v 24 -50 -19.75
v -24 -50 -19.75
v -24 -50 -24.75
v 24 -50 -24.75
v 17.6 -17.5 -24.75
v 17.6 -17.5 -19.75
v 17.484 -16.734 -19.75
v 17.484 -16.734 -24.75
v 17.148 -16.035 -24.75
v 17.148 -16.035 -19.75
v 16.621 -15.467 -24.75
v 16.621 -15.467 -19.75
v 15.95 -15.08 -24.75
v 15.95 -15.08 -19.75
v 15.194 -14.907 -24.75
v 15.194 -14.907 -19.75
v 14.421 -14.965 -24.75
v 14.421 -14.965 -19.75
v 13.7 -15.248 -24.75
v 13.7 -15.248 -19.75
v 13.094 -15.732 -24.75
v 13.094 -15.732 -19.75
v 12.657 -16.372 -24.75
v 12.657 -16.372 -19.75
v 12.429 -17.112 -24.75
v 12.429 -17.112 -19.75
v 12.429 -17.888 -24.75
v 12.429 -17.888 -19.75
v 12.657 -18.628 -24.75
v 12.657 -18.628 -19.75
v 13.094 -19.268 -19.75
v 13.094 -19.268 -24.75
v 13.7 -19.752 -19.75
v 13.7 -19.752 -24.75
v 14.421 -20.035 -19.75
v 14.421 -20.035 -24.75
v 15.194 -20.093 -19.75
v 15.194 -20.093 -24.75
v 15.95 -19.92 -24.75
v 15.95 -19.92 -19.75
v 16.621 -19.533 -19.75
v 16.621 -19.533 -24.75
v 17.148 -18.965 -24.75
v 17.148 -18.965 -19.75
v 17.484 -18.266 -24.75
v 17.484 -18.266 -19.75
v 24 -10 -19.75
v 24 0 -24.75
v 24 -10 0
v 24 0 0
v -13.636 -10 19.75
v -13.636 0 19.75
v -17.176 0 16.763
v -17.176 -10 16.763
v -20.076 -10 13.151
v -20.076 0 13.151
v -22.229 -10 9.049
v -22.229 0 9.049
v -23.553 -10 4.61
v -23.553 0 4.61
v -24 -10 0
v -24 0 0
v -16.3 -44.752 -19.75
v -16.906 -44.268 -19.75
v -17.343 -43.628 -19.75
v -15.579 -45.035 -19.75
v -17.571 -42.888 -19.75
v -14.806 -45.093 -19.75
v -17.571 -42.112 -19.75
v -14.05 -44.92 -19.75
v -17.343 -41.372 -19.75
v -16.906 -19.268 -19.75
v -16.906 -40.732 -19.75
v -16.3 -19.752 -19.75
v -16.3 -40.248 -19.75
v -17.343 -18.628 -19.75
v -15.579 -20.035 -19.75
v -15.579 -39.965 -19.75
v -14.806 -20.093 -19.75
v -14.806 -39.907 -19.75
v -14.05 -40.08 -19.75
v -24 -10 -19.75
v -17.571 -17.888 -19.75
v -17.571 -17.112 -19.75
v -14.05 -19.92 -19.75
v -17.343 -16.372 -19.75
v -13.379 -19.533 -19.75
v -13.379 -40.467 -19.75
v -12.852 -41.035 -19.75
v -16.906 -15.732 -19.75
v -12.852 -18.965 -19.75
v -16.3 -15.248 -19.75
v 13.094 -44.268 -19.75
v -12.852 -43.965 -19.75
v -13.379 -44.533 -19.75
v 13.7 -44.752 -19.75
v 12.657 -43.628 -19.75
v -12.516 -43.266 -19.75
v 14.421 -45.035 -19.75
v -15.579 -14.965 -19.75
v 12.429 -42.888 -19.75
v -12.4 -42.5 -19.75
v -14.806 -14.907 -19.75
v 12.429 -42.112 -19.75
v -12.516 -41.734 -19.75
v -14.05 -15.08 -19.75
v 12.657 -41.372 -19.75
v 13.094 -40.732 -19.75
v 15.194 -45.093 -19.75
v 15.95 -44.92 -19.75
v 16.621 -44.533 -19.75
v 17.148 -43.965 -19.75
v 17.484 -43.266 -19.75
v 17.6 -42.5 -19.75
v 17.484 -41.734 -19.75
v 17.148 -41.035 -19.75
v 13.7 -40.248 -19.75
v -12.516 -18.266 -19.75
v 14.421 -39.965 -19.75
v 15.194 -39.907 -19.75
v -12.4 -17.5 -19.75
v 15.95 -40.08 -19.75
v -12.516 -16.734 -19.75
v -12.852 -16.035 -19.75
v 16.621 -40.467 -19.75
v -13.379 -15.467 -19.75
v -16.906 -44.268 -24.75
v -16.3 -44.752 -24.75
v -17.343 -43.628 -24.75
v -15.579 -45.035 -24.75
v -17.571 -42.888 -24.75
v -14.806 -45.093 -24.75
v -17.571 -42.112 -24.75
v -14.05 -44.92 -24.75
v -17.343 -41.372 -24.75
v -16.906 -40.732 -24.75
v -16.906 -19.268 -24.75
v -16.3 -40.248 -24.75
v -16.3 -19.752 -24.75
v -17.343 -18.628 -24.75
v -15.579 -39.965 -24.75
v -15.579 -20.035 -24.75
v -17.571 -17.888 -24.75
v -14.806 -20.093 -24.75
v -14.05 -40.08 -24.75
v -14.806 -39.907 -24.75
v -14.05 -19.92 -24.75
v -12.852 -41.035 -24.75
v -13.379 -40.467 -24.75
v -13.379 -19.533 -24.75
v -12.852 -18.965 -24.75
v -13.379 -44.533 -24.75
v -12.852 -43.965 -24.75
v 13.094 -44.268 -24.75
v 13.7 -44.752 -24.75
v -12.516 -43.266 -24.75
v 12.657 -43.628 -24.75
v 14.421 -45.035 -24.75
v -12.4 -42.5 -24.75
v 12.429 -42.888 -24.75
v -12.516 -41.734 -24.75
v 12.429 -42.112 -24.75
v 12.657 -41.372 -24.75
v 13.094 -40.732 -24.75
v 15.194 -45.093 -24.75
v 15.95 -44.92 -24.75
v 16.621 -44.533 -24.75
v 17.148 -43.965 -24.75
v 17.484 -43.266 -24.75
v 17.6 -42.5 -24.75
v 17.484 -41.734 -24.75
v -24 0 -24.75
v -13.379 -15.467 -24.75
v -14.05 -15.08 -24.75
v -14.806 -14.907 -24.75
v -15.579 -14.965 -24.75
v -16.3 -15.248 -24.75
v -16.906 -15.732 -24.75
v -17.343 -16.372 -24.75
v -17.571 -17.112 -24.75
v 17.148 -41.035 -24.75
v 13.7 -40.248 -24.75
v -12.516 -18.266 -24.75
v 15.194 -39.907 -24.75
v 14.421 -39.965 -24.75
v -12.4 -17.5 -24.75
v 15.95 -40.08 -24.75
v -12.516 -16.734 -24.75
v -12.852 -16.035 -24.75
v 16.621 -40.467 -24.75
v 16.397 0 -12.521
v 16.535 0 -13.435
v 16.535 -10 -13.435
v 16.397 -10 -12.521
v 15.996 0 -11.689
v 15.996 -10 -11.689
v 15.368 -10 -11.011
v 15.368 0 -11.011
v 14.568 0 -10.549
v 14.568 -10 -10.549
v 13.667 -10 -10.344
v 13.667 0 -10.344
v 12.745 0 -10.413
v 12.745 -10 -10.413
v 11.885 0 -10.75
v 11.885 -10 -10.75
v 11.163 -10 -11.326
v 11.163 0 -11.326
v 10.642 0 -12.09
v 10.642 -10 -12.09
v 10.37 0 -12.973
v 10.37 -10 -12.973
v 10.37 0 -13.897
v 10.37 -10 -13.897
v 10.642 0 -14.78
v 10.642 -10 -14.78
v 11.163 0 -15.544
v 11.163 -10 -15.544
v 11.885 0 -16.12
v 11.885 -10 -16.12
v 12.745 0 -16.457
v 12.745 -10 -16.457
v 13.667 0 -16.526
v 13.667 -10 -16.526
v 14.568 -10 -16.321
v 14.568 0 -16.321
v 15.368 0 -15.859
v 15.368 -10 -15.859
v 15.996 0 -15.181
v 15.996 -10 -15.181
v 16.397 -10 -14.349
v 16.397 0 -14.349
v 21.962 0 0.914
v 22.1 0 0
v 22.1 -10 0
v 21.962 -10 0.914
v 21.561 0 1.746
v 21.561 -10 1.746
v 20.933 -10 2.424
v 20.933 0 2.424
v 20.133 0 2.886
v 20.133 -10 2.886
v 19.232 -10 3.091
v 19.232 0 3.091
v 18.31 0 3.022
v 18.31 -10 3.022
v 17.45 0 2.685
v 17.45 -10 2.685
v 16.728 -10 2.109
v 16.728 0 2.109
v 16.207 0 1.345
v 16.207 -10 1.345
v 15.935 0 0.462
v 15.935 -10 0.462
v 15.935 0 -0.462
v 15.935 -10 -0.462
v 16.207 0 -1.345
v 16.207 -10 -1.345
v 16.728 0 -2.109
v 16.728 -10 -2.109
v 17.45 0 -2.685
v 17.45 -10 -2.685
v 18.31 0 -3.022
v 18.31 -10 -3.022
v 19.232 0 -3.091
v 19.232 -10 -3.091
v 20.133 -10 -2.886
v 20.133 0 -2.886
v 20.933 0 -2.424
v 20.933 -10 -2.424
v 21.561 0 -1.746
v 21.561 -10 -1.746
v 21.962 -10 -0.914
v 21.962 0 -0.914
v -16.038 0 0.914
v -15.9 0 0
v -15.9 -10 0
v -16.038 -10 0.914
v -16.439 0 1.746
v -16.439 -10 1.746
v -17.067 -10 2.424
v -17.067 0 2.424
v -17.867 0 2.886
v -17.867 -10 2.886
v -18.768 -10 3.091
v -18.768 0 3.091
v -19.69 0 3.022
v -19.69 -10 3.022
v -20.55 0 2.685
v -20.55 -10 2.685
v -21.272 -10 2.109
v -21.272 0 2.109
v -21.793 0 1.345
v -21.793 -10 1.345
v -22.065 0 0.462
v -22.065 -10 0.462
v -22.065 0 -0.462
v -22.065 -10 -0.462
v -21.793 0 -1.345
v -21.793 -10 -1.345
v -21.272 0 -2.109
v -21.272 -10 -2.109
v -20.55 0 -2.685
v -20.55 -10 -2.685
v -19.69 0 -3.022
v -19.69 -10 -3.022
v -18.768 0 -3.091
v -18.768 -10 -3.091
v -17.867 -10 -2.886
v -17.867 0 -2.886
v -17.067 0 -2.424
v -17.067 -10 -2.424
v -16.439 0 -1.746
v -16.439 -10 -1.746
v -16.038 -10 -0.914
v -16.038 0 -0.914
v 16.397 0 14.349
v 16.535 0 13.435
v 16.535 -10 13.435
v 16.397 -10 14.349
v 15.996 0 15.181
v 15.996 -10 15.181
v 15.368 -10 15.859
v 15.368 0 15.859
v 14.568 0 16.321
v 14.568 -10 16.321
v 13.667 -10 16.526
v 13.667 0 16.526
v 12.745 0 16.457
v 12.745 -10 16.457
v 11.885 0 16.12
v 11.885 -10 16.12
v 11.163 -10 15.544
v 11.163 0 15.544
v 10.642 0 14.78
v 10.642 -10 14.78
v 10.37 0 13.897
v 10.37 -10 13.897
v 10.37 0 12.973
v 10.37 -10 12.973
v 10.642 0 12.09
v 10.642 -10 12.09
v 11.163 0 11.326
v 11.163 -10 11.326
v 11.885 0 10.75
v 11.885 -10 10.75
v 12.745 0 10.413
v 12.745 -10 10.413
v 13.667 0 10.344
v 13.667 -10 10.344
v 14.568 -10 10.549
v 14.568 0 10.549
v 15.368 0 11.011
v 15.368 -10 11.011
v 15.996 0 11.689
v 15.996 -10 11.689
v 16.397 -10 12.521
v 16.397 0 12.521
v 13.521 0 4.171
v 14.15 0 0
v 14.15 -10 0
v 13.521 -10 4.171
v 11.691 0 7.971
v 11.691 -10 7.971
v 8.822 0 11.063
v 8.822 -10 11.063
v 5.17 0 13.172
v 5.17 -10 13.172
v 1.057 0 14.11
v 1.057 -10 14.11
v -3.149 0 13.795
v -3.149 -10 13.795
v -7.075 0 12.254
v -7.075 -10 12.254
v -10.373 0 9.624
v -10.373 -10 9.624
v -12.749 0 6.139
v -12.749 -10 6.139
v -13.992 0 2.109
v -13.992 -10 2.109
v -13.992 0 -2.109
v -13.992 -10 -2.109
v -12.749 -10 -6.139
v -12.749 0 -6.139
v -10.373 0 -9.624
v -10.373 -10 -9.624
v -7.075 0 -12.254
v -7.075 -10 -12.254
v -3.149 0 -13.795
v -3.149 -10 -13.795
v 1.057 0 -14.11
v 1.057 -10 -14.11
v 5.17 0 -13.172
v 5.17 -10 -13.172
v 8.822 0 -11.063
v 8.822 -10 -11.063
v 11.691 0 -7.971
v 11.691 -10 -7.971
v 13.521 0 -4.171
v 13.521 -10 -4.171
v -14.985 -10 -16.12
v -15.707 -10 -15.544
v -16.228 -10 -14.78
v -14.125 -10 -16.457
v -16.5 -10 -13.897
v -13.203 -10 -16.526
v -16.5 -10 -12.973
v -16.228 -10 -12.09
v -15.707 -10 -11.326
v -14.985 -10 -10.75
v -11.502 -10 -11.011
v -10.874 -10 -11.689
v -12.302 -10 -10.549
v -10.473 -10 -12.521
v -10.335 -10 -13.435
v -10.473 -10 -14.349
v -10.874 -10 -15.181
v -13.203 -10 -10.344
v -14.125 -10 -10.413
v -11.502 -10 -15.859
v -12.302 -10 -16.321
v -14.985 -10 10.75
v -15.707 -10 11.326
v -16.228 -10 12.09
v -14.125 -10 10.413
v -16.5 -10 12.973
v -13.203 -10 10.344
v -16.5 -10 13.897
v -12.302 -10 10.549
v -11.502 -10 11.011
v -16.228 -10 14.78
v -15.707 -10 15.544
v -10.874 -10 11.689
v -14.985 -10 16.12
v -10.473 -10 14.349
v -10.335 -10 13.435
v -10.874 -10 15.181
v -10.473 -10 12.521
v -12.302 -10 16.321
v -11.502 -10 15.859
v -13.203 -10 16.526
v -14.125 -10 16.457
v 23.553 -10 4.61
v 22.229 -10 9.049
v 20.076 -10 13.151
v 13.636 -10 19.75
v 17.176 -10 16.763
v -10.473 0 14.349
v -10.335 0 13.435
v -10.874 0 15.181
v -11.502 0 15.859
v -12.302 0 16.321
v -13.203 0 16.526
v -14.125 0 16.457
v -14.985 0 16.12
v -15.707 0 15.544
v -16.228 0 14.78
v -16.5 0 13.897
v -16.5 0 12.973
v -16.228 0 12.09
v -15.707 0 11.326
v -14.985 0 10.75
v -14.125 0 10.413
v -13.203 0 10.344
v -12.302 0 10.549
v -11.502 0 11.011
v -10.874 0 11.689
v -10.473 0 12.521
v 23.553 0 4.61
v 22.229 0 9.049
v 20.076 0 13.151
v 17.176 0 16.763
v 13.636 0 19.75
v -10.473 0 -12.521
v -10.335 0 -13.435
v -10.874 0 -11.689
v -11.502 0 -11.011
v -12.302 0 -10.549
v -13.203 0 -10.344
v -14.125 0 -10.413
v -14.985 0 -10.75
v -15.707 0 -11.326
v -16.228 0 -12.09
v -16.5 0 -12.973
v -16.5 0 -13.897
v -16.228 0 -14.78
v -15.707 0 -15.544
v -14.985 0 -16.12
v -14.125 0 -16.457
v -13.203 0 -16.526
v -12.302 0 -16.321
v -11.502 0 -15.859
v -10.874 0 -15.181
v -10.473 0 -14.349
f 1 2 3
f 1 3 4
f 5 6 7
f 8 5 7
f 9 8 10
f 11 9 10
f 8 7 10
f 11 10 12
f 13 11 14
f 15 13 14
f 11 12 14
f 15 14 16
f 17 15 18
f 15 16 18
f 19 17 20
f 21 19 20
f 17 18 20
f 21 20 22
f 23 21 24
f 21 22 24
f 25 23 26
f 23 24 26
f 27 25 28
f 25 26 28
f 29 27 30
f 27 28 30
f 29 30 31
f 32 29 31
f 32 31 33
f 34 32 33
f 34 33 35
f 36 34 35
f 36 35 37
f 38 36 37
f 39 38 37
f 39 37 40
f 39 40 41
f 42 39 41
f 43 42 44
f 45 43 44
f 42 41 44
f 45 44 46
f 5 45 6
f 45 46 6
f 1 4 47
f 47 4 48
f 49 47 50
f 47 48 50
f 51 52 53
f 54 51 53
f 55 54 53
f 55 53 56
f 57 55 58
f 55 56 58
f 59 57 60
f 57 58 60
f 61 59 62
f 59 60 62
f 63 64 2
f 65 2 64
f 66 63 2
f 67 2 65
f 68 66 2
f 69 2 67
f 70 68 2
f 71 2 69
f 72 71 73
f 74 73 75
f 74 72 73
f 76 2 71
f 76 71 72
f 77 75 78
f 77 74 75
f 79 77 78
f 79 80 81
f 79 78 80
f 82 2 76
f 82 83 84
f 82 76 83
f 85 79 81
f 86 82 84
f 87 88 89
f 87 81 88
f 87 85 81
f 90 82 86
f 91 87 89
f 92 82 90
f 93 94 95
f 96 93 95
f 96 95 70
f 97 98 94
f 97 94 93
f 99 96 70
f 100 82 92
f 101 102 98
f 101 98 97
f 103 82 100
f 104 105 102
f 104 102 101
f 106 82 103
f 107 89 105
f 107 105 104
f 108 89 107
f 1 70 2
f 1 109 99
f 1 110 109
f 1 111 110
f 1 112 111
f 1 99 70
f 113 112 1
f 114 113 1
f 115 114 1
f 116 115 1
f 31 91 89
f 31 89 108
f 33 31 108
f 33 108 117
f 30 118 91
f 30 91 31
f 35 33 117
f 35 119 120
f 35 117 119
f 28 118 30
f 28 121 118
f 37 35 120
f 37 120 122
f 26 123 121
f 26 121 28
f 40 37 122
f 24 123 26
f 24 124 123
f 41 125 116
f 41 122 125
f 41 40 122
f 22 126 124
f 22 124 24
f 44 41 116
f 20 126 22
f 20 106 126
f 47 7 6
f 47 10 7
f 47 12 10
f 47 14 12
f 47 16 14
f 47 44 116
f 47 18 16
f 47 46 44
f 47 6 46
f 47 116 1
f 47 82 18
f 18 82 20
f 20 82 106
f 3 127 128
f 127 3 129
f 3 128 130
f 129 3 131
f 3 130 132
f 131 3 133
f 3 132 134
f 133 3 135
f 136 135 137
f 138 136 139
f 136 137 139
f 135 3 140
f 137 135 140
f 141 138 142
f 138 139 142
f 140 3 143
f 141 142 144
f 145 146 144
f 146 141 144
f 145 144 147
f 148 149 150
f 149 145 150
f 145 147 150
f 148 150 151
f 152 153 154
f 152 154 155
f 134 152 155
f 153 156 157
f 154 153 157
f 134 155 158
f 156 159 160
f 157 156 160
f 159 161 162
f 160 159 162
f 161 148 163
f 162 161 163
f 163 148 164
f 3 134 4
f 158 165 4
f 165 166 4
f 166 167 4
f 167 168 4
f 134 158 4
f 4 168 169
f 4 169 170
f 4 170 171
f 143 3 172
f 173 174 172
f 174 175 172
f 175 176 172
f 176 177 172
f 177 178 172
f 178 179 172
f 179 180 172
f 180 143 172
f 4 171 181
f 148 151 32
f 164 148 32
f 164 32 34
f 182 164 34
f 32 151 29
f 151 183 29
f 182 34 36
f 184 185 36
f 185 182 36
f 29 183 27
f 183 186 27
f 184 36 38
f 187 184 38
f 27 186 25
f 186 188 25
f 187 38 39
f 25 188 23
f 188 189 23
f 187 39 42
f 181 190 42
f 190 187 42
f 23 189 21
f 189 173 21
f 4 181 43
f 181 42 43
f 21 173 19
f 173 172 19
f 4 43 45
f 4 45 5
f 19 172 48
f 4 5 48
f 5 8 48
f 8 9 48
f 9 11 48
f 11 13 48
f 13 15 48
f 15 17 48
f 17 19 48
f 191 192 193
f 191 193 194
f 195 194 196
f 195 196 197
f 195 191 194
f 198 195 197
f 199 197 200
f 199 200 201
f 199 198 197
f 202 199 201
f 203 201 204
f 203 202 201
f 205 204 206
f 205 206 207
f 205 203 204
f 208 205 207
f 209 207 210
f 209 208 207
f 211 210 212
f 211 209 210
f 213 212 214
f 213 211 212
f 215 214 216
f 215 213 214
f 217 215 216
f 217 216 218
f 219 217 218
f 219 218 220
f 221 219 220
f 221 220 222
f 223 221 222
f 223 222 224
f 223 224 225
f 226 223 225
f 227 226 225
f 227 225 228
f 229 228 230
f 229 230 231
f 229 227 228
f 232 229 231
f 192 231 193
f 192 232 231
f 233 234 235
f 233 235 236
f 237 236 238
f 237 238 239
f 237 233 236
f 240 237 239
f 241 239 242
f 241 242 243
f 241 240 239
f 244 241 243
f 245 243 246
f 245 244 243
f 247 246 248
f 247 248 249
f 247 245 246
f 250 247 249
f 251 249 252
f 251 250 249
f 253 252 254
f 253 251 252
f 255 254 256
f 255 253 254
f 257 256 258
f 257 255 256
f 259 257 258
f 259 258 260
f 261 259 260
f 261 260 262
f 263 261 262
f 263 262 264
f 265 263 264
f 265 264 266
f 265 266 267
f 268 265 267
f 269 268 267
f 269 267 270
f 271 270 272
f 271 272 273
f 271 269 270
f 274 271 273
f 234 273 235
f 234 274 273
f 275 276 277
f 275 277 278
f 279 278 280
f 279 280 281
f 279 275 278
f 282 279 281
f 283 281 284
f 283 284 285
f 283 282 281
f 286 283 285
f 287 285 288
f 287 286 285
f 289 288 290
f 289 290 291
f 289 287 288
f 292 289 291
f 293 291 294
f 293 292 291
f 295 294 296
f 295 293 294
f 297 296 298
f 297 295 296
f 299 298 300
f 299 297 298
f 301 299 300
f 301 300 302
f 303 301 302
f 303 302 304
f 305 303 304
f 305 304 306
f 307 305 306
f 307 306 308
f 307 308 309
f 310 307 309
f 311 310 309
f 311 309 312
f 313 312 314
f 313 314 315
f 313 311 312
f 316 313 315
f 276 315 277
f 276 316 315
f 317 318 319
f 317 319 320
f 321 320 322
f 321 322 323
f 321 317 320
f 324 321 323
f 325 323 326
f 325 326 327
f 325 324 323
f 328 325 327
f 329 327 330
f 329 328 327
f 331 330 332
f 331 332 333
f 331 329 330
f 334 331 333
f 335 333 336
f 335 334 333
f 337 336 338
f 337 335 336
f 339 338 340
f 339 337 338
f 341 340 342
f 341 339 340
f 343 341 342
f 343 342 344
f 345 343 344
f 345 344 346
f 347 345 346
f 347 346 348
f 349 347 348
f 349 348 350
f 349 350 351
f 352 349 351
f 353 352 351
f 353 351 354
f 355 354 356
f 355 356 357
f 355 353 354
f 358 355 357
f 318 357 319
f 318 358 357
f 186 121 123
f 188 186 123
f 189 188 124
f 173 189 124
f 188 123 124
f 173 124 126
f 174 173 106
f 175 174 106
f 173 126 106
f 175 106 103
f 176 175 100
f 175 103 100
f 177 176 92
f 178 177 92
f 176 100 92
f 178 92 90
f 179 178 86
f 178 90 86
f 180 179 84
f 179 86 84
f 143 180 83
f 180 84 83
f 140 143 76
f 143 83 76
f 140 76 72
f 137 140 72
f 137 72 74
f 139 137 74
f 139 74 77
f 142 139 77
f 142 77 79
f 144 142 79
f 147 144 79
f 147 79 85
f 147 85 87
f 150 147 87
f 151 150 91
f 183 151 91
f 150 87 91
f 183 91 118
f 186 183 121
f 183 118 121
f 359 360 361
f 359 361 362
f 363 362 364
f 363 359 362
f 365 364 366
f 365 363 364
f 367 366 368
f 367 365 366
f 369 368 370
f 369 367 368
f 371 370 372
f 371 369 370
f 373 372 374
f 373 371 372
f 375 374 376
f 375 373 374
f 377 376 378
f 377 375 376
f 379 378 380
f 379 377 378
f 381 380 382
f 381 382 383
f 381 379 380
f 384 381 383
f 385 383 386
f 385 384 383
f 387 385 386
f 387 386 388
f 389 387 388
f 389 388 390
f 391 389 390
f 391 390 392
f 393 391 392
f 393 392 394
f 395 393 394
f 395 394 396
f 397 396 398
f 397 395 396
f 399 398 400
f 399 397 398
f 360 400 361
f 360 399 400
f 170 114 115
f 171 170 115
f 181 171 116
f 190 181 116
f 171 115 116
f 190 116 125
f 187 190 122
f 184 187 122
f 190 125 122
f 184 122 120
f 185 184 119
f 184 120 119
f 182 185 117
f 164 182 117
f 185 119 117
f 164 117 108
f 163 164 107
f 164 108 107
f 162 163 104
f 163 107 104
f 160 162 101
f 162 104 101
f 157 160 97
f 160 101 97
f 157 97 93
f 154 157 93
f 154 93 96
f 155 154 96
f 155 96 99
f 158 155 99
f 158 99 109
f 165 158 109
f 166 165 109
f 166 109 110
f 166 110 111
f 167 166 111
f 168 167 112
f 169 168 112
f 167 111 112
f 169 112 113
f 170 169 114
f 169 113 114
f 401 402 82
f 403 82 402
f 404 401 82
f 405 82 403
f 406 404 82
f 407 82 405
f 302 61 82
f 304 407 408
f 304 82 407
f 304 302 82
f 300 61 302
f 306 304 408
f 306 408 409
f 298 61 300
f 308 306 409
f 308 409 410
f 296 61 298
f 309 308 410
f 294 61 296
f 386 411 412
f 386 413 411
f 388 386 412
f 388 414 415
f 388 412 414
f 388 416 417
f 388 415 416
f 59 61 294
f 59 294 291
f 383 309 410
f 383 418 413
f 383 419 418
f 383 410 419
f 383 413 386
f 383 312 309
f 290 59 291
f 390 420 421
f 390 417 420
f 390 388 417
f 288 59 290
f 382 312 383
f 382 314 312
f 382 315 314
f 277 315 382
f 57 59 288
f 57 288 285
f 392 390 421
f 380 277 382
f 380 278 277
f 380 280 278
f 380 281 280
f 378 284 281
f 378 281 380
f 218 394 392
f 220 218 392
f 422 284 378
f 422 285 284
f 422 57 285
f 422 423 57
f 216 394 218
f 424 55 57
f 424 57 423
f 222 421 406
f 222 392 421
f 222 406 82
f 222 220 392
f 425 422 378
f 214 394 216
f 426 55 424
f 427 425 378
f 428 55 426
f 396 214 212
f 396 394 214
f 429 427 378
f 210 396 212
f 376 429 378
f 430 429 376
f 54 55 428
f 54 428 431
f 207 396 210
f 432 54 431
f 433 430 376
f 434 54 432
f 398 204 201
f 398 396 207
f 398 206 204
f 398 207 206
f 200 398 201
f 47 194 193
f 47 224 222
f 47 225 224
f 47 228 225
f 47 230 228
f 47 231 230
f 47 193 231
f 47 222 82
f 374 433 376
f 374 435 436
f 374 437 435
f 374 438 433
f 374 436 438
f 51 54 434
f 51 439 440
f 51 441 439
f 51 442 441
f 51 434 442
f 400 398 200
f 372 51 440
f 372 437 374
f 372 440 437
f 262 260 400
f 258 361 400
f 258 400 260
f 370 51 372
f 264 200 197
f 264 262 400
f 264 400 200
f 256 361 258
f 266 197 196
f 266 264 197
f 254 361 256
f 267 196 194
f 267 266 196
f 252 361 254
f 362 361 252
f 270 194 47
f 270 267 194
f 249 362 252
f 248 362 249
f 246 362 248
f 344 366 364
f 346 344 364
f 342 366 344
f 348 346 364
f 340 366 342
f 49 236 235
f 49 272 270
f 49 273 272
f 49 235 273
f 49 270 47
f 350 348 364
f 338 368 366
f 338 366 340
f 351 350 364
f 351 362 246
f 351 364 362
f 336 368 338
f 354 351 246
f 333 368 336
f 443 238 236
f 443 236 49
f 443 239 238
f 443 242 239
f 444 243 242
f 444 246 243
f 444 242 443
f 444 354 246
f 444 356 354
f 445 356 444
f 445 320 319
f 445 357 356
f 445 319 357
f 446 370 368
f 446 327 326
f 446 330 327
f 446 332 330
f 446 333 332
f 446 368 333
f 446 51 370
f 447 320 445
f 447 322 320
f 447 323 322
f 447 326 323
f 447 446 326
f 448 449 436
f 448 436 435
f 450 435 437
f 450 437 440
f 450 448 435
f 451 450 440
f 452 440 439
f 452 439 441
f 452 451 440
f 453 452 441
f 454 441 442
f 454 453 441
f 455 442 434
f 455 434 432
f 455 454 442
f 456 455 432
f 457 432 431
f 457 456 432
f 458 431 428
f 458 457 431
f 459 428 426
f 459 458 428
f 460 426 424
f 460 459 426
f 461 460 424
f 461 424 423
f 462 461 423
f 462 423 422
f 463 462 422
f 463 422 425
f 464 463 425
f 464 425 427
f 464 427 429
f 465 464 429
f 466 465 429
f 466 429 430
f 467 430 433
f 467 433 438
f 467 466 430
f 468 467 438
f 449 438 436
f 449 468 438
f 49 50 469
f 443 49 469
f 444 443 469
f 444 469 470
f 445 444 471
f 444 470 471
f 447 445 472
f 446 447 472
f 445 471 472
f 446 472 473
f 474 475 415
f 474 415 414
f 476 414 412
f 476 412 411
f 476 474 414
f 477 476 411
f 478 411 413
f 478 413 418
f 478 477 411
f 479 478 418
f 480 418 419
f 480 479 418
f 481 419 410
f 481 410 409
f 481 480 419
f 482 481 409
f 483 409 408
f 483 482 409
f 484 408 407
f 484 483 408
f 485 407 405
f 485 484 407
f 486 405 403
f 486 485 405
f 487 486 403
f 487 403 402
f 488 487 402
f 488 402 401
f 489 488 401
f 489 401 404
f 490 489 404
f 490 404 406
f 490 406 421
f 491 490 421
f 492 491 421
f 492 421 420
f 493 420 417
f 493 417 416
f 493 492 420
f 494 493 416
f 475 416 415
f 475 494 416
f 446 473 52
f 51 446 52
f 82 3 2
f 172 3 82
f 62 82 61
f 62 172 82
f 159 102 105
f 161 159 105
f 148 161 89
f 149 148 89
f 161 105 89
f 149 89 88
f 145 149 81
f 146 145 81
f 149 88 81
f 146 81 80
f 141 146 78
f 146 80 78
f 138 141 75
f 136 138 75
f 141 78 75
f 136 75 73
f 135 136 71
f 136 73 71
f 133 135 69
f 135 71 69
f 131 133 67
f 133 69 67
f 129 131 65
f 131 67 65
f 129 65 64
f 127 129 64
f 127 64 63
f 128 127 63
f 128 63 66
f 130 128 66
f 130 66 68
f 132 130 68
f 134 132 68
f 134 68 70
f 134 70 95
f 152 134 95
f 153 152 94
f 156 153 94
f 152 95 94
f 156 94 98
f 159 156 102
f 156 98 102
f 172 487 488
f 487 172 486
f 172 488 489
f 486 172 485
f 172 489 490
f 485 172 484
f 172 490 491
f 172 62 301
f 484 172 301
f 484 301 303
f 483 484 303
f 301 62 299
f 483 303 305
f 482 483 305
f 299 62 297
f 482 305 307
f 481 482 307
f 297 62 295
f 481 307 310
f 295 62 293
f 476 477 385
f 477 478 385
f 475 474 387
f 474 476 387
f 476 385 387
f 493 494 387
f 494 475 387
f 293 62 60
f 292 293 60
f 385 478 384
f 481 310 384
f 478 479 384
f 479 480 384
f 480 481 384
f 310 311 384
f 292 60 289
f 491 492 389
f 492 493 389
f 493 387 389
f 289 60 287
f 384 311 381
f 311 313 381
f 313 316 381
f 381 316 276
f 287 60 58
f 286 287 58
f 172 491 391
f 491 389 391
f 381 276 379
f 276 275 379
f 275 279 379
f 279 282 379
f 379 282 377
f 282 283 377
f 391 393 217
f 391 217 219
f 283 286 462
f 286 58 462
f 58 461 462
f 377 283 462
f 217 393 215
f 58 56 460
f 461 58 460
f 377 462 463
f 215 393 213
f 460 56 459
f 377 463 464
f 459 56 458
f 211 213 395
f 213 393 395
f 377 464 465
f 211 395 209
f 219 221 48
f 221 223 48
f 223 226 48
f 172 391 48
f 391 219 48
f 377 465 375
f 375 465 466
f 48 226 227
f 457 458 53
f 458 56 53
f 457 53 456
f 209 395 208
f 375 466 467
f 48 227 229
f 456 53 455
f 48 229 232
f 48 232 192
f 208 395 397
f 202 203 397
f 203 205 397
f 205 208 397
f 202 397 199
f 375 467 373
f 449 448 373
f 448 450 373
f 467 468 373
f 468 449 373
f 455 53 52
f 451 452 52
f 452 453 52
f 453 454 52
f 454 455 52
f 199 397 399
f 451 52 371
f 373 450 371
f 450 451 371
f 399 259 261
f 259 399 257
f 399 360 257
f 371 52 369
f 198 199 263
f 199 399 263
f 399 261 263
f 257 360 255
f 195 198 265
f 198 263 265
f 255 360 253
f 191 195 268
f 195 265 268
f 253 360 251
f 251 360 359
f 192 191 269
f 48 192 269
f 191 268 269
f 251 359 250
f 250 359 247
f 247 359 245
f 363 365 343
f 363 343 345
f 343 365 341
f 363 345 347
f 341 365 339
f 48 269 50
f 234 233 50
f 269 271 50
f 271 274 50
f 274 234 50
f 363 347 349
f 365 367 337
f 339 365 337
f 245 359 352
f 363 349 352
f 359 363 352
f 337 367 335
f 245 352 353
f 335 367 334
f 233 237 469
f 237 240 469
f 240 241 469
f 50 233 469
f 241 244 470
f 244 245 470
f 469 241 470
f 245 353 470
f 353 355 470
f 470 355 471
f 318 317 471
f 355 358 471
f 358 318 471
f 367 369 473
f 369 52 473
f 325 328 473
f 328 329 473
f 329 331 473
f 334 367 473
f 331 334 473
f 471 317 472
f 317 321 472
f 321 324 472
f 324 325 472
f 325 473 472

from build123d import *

# Parameters (mm, degrees)
F0_R     = 3.1
F0_R_2   = 14.15
F1_DEPTH = 10
F2_W     = 48
F2_H     = 5
F3_DEPTH = 40
F4_R     = 2.6
F5_DEPTH = 5


with BuildPart() as f1:
    # F0 (on Front) → F1 (new body)
    with BuildSketch(Plane.XZ):
        with BuildLine():
            Line((13.63589, 19.75), (-13.63589, 19.75))
            ThreePointArc((-13.63589, 19.75), (-21.251604, 11.152099), (-24, 0))
            Line((-24, 0), (-24, -24.75))
            Line((-24, -24.75), (24, -24.75))
            Line((24, -24.75), (24, 0))
            ThreePointArc((24, 0), (21.251604, 11.152099), (13.63589, 19.75))
        make_face()
        with Locations((-13.435029, -13.435029)):
            Circle(F0_R, mode=Mode.SUBTRACT)
        with Locations((13.435029, -13.435029)):
            Circle(F0_R, mode=Mode.SUBTRACT)
        with Locations((-19, 0)):
            Circle(F0_R, mode=Mode.SUBTRACT)
        with Locations((-13.435029, 13.435029)):
            Circle(F0_R, mode=Mode.SUBTRACT)
        Circle(F0_R_2, mode=Mode.SUBTRACT)
        with Locations((19, 0)):
            Circle(F0_R, mode=Mode.SUBTRACT)
        with Locations((13.435029, 13.435029)):
            Circle(F0_R, mode=Mode.SUBTRACT)
    extrude(amount=F1_DEPTH)

    # F2 (on face) → F3 (join)
    with BuildSketch(Plane.XZ.offset(10)):
        with Locations((0, -22.25)):
            Rectangle(F2_W, F2_H)
    extrude(amount=F3_DEPTH)

    # F4 (on face) → F5 (cut, through all)
    with BuildSketch(Plane.XY.offset(-19.75)):
        with Locations((-15, -17.5)):
            Circle(F4_R)
        with Locations((-15, -42.5)):
            Circle(F4_R)
        with Locations((15, -42.5)):
            Circle(F4_R)
        with Locations((15, -17.5)):
            Circle(F4_R)
    extrude(amount=-F5_DEPTH, mode=Mode.SUBTRACT)


solid = f1.part
